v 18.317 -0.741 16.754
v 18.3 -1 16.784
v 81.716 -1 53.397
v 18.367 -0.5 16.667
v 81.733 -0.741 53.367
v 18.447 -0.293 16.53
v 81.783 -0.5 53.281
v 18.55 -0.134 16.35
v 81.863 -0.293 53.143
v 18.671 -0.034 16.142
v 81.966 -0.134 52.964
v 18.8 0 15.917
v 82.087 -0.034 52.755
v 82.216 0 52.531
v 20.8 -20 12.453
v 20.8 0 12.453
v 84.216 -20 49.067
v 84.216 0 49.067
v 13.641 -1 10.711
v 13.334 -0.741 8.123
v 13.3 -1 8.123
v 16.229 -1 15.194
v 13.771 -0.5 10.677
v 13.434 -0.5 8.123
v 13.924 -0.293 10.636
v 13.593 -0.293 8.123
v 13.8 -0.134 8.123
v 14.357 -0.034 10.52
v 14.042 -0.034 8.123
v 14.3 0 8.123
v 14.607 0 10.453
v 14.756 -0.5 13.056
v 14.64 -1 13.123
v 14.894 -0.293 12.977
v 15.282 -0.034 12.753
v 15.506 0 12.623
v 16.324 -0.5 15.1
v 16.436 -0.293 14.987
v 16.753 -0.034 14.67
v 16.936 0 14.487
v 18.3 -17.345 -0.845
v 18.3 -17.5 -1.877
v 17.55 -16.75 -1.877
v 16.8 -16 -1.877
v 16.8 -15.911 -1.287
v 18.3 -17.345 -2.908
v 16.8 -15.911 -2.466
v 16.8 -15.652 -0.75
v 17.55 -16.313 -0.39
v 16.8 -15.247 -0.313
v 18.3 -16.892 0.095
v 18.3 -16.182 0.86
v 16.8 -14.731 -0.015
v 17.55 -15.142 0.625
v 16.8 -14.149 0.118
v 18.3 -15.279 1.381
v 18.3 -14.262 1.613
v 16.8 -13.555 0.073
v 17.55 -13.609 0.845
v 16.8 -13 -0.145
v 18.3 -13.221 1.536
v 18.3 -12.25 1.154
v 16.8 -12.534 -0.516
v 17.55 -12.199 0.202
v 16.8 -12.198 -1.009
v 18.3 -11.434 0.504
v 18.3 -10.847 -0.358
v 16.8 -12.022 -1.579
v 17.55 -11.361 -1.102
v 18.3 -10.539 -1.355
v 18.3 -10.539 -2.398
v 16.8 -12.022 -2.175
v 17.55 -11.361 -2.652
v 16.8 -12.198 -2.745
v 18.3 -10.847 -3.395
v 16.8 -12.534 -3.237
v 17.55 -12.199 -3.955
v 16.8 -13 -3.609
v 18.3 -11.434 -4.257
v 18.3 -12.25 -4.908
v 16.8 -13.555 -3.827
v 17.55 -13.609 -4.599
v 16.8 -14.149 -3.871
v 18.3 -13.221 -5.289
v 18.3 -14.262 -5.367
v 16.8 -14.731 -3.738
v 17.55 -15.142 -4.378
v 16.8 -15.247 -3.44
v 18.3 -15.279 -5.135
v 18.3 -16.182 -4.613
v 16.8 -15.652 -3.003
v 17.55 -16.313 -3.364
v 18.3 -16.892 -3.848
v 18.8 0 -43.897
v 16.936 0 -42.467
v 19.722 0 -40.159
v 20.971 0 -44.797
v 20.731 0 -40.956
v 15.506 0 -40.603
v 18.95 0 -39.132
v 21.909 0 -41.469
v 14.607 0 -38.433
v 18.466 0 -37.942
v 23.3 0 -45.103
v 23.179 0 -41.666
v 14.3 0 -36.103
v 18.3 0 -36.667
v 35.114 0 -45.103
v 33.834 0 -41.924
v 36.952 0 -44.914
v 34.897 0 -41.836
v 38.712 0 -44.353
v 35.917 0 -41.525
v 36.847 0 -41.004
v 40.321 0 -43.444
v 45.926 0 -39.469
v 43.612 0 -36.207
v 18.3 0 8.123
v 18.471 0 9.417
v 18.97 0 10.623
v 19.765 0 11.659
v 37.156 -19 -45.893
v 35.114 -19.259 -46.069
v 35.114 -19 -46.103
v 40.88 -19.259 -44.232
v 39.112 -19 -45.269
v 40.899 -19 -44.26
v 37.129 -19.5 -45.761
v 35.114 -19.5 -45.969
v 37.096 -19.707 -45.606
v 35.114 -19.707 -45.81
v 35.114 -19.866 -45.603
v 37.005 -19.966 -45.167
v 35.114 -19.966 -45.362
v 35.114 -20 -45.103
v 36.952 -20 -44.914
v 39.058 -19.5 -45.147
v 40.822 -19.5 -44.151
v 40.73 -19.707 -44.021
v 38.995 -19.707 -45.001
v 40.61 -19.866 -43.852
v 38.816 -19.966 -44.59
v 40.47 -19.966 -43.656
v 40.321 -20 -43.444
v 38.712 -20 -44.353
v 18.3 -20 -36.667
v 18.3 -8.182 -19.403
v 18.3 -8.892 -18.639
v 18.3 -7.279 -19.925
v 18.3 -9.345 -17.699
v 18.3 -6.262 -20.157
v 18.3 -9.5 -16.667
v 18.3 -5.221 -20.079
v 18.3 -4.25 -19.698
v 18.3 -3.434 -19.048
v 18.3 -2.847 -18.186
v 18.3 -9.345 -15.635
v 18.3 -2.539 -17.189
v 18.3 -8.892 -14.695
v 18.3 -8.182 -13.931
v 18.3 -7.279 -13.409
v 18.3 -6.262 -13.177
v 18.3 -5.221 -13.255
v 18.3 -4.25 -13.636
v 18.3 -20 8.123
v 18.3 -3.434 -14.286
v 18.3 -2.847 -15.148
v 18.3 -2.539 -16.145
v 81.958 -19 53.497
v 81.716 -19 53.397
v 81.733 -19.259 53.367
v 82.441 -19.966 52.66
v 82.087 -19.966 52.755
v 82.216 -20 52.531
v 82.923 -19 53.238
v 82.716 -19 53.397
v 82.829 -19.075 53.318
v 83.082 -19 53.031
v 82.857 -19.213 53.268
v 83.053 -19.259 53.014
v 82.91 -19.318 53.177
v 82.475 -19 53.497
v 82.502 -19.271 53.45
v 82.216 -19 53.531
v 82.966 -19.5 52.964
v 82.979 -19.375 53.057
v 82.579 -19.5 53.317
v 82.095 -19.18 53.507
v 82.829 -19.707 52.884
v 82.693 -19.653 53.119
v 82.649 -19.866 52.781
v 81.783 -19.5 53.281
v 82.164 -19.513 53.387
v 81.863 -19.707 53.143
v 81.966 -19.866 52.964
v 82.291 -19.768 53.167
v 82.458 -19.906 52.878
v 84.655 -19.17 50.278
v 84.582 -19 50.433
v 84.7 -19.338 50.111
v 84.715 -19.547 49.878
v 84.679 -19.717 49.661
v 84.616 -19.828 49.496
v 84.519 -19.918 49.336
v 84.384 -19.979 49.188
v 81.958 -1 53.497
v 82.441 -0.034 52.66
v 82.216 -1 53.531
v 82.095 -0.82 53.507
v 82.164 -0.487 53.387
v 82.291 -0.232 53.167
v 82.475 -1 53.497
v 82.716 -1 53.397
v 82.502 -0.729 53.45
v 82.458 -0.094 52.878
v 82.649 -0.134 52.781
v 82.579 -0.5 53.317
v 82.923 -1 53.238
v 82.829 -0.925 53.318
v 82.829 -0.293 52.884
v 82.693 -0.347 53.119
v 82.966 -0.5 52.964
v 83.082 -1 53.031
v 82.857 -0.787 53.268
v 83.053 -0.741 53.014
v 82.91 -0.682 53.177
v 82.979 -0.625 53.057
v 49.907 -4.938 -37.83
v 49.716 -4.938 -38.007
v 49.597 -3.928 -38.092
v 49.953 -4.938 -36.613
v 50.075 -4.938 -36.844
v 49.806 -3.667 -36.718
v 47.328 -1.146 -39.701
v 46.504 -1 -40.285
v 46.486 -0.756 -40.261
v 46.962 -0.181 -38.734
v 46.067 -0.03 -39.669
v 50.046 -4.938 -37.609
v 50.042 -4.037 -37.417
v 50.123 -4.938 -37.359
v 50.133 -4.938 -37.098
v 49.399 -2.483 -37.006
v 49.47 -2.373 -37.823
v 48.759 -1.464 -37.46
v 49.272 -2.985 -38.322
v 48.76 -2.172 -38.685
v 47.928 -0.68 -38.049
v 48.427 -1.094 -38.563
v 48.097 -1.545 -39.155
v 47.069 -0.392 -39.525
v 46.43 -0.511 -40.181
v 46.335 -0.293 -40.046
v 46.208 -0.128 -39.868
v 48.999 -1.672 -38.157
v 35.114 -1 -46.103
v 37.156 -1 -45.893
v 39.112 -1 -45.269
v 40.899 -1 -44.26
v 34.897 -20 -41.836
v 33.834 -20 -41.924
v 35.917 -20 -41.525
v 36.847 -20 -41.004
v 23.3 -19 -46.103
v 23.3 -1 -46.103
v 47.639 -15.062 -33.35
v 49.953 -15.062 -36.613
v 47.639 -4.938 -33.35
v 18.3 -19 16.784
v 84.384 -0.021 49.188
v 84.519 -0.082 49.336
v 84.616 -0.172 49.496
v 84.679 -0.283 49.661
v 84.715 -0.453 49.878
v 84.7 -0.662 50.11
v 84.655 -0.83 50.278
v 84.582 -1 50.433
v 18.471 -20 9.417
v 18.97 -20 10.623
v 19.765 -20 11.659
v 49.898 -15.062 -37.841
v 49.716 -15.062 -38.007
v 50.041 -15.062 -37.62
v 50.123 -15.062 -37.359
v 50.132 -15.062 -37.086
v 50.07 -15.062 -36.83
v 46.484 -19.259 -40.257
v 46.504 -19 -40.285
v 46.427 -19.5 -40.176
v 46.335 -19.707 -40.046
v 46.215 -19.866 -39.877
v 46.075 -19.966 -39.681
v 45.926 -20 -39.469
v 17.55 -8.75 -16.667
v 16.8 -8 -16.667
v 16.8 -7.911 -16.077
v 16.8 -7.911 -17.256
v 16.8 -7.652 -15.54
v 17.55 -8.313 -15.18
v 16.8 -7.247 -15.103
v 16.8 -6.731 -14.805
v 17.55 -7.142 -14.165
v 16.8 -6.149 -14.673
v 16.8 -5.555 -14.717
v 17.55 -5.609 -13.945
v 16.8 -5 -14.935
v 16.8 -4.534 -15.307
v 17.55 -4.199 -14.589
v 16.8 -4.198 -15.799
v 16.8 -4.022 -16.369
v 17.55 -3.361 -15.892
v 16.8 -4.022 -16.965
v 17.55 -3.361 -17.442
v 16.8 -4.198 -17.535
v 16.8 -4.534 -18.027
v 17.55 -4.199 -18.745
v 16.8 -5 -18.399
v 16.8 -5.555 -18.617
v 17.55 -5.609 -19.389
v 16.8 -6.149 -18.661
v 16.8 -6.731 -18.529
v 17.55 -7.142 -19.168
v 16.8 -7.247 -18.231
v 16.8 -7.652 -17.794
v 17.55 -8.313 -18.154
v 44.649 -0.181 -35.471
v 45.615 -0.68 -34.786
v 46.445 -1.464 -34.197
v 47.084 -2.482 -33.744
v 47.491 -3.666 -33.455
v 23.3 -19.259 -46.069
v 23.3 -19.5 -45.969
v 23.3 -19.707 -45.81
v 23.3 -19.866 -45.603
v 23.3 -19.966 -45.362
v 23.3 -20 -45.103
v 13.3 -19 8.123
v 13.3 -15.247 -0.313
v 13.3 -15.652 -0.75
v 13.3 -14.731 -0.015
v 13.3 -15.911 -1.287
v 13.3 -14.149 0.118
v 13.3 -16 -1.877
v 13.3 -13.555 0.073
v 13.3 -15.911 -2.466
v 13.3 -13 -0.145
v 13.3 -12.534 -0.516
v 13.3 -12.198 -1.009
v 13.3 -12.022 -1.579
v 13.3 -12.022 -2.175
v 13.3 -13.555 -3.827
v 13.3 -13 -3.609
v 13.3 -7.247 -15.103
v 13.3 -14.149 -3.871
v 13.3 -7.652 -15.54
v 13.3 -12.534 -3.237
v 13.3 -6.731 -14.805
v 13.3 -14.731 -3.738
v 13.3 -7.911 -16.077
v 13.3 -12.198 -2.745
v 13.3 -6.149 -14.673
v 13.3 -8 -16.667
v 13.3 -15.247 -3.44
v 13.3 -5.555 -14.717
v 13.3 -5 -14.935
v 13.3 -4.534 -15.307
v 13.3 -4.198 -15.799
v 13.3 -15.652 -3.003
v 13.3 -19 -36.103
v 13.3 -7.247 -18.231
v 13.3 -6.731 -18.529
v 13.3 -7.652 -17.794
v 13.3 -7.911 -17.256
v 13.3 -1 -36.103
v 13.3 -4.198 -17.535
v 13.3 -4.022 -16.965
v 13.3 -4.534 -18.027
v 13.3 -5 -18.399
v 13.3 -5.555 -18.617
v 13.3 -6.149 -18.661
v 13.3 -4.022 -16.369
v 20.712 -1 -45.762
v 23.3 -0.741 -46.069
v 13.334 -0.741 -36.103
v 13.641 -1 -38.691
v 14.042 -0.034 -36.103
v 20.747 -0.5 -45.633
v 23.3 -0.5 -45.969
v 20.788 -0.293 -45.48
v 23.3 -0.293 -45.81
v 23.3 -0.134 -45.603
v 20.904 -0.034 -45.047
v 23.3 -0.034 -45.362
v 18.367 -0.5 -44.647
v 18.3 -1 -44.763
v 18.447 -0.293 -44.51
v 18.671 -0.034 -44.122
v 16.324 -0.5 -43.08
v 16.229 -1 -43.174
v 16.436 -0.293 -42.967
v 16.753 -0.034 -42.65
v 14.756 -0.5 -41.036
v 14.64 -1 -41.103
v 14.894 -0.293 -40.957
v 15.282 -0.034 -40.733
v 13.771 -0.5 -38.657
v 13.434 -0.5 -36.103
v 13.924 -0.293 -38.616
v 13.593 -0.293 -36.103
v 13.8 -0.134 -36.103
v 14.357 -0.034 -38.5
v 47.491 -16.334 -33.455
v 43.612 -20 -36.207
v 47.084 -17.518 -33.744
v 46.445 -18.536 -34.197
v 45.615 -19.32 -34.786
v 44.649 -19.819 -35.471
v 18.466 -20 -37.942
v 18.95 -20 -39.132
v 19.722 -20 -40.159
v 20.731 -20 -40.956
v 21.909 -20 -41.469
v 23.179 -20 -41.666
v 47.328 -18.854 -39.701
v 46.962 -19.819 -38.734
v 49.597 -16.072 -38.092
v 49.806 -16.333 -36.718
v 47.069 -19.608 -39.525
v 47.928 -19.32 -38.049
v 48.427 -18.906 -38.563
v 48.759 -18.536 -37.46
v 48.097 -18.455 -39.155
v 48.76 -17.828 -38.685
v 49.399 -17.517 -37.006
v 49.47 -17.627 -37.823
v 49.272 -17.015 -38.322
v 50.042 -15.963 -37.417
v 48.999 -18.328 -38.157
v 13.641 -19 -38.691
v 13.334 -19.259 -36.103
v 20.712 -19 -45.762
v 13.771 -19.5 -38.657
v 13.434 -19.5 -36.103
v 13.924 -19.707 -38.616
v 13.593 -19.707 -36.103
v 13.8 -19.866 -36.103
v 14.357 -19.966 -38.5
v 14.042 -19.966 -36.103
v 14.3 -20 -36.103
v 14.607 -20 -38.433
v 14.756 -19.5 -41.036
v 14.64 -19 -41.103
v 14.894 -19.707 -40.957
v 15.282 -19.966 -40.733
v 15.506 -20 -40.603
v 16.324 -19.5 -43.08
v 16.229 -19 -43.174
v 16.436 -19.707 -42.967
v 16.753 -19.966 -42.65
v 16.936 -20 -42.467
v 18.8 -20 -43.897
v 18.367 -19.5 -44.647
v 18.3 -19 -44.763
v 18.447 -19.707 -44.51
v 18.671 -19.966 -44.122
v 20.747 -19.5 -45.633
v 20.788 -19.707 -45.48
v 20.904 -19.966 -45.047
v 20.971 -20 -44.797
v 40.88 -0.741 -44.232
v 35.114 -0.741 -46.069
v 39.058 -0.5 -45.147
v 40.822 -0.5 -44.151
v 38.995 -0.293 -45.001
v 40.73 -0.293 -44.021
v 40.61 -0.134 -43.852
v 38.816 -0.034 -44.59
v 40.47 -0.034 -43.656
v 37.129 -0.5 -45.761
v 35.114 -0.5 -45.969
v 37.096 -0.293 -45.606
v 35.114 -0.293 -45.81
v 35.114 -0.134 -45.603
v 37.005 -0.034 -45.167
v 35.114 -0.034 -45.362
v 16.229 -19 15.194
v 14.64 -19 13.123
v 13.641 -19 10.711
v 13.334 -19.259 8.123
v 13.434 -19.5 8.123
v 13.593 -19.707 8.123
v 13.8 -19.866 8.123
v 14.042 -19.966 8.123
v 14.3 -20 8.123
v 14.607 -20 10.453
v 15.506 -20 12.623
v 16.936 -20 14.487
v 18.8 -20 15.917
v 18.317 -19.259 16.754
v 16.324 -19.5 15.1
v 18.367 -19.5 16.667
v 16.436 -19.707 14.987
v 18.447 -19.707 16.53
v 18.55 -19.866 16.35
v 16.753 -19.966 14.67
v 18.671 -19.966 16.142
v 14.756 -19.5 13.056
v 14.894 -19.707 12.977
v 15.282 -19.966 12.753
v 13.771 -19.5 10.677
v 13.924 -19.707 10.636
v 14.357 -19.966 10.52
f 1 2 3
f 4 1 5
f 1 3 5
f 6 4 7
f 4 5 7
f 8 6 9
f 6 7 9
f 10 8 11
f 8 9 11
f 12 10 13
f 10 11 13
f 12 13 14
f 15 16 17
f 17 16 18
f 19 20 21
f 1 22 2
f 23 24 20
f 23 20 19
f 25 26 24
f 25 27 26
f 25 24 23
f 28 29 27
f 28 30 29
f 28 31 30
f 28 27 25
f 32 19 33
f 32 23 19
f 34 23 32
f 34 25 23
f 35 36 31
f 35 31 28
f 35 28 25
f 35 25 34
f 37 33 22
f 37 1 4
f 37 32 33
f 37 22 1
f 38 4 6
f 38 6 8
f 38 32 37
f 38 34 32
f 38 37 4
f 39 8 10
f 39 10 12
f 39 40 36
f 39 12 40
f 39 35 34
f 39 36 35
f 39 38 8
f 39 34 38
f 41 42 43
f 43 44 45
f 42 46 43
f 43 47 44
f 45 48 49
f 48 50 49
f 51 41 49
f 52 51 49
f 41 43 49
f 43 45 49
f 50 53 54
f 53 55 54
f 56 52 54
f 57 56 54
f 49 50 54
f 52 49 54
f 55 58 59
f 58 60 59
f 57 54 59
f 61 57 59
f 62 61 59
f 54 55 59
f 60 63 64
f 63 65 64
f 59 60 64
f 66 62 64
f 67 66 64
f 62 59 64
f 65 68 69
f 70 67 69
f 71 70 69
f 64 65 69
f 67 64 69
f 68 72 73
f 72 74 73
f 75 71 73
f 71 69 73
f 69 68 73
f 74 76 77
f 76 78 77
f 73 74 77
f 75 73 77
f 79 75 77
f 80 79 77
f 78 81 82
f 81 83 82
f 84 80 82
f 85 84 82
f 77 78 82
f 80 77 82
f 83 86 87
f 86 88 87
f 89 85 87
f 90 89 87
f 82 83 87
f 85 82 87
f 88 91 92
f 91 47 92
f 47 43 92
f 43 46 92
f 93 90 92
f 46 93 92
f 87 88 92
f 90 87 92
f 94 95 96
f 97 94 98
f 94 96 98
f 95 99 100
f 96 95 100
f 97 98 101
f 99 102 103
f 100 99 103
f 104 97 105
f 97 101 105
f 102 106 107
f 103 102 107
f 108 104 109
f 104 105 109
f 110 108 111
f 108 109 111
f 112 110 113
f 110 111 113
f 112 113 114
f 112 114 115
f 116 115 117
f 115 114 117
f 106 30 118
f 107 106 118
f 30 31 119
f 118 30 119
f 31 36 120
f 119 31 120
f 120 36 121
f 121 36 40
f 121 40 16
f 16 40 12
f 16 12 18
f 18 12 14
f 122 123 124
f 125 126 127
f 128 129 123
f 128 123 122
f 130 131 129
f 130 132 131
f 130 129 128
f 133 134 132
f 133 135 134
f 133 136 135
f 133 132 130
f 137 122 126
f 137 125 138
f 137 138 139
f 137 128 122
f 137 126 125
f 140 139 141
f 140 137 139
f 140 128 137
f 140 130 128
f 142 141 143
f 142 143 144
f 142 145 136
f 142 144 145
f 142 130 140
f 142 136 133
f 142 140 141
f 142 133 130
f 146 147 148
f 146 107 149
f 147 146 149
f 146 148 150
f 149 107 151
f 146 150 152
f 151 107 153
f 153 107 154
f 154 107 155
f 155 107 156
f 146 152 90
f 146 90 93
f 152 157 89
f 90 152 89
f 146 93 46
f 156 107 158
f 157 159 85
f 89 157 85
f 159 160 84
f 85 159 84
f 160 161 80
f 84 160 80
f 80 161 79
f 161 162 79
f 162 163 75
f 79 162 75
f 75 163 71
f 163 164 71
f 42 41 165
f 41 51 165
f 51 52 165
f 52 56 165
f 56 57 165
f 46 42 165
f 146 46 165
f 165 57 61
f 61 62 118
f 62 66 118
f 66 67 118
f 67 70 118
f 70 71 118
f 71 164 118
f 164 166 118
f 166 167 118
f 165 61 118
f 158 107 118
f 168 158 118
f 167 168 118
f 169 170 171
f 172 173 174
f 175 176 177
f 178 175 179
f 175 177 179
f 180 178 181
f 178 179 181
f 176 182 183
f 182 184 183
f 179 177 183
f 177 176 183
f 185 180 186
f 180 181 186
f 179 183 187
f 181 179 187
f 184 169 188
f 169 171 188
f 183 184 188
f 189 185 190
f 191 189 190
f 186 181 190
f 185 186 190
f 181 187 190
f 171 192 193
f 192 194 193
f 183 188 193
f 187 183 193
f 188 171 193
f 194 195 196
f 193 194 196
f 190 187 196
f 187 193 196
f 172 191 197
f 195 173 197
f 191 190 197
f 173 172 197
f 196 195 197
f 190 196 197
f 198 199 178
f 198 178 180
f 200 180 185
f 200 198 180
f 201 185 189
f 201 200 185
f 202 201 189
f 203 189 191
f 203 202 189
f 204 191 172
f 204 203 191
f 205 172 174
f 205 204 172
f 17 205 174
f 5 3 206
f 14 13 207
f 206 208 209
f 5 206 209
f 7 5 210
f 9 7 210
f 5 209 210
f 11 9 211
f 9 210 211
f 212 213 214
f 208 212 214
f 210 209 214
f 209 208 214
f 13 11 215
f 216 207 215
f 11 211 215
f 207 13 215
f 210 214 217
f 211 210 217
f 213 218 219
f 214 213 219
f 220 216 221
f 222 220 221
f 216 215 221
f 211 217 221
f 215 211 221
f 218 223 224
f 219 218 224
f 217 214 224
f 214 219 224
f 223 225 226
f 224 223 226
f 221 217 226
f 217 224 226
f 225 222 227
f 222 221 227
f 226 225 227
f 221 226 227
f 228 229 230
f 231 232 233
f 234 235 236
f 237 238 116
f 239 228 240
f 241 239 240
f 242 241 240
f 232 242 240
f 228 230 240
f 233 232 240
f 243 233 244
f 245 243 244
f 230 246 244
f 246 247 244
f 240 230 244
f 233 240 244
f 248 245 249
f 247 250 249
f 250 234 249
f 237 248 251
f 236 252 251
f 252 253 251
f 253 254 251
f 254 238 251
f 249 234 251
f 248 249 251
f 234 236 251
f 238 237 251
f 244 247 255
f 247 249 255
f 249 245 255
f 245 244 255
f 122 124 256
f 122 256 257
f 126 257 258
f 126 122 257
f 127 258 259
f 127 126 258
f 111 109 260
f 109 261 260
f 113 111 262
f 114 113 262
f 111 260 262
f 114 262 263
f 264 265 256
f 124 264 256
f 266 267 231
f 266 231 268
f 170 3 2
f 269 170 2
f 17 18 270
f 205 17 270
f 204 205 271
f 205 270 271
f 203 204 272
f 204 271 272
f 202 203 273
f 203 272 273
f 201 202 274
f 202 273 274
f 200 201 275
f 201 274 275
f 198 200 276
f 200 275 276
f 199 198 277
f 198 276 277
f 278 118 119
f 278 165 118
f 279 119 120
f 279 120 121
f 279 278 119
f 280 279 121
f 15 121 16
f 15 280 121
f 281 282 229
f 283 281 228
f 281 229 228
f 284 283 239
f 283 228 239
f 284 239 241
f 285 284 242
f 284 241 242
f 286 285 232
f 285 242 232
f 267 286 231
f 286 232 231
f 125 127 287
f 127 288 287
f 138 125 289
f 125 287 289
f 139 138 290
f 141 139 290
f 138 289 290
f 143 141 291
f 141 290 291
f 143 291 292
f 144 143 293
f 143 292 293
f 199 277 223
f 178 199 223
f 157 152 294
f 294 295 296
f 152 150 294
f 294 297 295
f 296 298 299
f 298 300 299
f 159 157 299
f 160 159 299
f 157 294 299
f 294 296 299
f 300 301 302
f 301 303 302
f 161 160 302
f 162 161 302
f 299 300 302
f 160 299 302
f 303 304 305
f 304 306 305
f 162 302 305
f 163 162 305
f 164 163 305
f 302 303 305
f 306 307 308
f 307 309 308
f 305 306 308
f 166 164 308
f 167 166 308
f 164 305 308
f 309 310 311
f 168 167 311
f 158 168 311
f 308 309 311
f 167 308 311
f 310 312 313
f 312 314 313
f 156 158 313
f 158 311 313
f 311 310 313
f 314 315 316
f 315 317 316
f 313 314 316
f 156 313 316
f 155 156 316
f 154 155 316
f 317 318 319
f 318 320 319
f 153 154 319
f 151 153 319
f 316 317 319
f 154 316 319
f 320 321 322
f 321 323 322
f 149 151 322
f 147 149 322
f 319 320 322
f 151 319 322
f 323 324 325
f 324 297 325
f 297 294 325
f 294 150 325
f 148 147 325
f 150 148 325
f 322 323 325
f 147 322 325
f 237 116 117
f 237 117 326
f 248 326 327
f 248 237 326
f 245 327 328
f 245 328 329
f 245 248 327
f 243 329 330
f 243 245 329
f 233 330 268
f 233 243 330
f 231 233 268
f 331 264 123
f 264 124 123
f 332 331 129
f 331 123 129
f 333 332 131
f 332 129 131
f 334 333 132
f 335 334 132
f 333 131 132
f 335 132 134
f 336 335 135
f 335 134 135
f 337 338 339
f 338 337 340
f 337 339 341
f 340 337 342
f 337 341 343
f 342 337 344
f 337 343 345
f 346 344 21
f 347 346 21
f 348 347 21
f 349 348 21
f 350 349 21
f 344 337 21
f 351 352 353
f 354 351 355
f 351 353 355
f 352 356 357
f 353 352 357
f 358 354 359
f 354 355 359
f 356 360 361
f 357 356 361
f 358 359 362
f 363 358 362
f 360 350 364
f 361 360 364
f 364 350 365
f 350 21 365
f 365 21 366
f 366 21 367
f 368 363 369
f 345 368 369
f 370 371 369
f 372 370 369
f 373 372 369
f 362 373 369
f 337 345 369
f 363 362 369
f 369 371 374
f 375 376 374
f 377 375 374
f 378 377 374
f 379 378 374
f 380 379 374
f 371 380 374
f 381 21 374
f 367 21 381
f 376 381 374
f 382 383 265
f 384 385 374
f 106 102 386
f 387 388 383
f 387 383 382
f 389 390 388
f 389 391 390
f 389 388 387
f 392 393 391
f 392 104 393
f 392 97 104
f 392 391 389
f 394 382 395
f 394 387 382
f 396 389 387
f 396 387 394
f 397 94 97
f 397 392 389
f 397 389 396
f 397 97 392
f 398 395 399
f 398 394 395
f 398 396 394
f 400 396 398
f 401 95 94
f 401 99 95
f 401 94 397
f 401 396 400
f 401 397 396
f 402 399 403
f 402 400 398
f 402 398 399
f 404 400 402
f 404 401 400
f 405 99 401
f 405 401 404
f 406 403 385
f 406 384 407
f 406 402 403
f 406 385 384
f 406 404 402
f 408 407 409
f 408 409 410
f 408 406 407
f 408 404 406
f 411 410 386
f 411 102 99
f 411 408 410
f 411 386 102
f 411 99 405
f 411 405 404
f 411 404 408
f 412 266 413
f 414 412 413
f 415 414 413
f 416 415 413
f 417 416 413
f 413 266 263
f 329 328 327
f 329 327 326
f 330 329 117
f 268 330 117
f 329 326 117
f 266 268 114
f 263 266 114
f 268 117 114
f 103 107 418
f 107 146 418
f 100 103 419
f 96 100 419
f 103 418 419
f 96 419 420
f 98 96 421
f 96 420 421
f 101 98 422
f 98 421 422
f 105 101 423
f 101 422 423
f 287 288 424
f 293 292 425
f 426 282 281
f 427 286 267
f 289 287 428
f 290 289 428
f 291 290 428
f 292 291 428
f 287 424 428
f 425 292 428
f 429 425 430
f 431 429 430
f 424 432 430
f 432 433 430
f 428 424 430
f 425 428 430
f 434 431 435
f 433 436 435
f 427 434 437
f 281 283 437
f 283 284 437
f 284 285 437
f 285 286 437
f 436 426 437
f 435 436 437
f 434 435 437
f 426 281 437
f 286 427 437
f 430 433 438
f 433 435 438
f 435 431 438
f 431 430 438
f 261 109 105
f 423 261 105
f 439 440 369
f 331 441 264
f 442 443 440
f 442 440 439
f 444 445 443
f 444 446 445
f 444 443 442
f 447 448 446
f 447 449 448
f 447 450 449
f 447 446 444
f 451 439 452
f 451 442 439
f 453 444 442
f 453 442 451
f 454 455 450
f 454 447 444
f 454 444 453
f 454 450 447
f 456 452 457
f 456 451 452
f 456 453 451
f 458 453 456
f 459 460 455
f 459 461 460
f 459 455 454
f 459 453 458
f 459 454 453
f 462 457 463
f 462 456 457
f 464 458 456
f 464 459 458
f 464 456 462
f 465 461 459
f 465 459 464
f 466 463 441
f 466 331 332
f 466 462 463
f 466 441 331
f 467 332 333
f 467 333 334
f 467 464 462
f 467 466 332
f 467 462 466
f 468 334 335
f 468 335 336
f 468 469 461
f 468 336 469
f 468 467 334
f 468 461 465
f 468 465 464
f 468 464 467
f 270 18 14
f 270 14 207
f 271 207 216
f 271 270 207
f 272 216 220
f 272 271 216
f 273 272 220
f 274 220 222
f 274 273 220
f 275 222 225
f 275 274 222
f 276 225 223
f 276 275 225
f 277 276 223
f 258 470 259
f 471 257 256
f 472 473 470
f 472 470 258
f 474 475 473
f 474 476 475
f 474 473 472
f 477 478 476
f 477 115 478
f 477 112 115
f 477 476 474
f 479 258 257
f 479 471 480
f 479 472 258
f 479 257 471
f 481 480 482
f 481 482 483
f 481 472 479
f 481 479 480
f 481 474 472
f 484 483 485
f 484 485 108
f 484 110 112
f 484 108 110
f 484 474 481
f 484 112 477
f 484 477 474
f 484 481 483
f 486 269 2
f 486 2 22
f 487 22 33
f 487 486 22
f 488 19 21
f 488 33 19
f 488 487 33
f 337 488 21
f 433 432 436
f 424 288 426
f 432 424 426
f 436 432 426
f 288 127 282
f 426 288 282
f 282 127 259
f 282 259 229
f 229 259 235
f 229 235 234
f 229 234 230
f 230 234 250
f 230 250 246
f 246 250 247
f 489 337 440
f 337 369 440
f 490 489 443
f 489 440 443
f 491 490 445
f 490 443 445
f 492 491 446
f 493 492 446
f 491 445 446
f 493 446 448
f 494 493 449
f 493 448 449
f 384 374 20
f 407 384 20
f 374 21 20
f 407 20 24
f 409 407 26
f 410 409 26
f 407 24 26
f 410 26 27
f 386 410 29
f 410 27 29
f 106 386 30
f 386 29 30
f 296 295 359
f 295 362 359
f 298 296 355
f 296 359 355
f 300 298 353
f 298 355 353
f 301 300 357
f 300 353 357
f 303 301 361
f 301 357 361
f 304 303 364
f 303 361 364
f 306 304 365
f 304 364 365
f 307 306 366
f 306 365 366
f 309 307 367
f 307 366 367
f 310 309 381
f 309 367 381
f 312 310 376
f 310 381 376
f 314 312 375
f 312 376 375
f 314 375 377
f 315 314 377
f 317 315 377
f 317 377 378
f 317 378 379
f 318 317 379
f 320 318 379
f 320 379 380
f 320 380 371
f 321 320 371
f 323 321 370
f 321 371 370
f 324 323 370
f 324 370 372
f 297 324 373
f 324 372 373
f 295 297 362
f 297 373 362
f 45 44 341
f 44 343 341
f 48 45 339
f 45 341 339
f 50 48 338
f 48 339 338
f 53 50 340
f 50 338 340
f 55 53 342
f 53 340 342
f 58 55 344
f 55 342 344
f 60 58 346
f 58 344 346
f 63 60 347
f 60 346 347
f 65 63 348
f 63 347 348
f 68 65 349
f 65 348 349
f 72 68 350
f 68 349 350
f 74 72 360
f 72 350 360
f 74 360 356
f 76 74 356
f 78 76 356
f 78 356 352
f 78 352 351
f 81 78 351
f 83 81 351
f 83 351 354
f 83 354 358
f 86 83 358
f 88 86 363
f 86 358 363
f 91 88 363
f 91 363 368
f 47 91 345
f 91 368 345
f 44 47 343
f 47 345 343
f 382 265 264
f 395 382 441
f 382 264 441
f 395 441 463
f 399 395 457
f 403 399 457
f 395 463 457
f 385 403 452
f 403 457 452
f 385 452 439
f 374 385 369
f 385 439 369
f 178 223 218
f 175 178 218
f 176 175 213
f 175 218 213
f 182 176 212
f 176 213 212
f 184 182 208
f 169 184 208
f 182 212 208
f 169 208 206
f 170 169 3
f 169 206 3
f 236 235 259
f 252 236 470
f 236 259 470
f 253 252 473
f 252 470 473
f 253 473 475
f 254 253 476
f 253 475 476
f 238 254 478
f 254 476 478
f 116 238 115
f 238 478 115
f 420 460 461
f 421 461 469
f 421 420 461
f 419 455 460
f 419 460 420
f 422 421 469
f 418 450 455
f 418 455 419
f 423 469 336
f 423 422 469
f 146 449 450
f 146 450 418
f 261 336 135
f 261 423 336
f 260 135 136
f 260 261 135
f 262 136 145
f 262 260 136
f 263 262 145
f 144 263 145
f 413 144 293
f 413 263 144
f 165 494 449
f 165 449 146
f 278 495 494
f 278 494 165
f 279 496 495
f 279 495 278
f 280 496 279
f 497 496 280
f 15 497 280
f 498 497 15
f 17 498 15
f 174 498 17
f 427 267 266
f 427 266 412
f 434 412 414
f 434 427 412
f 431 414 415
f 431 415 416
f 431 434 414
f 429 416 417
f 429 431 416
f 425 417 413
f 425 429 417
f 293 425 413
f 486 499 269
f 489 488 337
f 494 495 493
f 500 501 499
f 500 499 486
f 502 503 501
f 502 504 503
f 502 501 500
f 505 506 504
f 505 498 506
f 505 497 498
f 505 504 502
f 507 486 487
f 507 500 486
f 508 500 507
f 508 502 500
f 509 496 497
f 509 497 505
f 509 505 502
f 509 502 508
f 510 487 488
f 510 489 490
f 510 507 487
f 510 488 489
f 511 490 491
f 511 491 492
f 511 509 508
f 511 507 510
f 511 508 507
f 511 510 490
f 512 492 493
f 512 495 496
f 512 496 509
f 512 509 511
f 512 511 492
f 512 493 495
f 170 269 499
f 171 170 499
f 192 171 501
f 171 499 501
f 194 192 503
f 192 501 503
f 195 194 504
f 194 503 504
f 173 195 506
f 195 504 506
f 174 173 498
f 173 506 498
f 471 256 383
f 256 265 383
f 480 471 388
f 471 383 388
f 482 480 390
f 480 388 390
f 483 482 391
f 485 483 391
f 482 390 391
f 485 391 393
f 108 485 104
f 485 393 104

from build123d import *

# Parameters (mm, degrees)
F1_DEPTH       = 20
F2_R           = 10
F3_R           = 10
F4_R           = 5
F5_R           = 5
F6_R           = 5
F8_D           = 4
F8_DEPTH       = 12
F8_CSINK_D     = 7
F8_CSINK_ANGLE = 90
F8_TIP         = 1.2017212381
F9_T1_DEPTH    = 30.0048285071
F10_R          = 1
F11_T1_DEPTH   = 25
F11_T3_DEPTH   = 18
F11_T5_DEPTH   = 6.5
F11_T8_ANGLE   = 90
F11_T10_ANGLE  = 90


# Not quite as in the source:
# - a fillet or chamfer that OpenCascade refuses, or shapes differently, is made with other operations: its cross-section is extruded or revolved along the edge and cut away or added


with BuildPart() as f1:
    # F0 (on Front) → F1 (new body)
    with BuildSketch(Plane.XZ):
        Polygon((13.3003787555, -46.1032405242), (38.3003787555, -46.1032405242), (50.5316518247, -37.4287553132), (47.6391971652, -33.3503112419), (35.4933471628, -41.9642139506), (18.3003787555, -41.5471586402), (18.3003787555, 11.0100081298), (85.0824110582, 49.5666324568), (82.5824110582, 53.8967594758), (13.3003787555, 13.8967594758), align=None)
    extrude(amount=F1_DEPTH)

    # F2
    f2_edges = [f1.edges().sort_by_distance(p)[0] for p in [
        (13.300379, -10, 13.896759),
        (13.300379, -10, -46.103241),
    ]]
    fillet(f2_edges, radius=F2_R)

    # F3
    f3_edges = [f1.edges().sort_by_distance(p)[0] for p in [
        (38.300379, -10, -46.103241),
    ]]
    fillet(f3_edges, radius=F3_R)

    # F4
    f4_edges = [f1.edges().sort_by_distance(p)[0] for p in [
        (18.300379, -10, 11.010008),
    ]]
    fillet(f4_edges, radius=F4_R)

    # F5
    f5_edges = [f1.edges().sort_by_distance(p)[0] for p in [
        (18.300379, -10, -41.547159),
    ]]
    fillet(f5_edges, radius=F5_R)

    # F6
    f6_edges = [f1.edges().sort_by_distance(p)[0] for p in [
        (35.493347, -10, -41.964214),
    ]]
    fillet(f6_edges, radius=F6_R)

    # F8
    with Locations(Plane.YZ.offset(18.3003787555)):
        with Locations((-6, -16.6669744052), (-14, -1.8767432161)):
            CounterSinkHole(F8_D / 2, F8_CSINK_D / 2, depth=F8_DEPTH, counter_sink_angle=F8_CSINK_ANGLE)
            with Locations((0, 0, -(F8_DEPTH + F8_TIP / 2))):  # 118° drill point
                Cone(0, F8_D / 2, F8_TIP, mode=Mode.SUBTRACT)

    # F9: fillet of radius 5 on 2 edges, made by hand

    # F9_s2 → F9_t1 (cut)
    with BuildSketch(Plane(origin=(41.804493112, 0, -58.9455349028), x_dir=(0, 1, 0), z_dir=(-0.5784909319, 0, 0.8156888143))):
        with BuildLine():
            ThreePointArc((0.0004, -14.5649419331), (-1.4644660941, -18.1014415245), (-5.0009656854, -19.5663076185))
            Line((-5.0009656854, -19.5663076185), (-5.0009656854, -20.0664441871))
            ThreePointArc((-5.0009656854, -20.0664441871), (-2.5004828427, -20.0660441871), (0, -20.0660441871))
            Line((0, -20.0660441871), (0.5001365685, -19.5659076185))
            ThreePointArc((0.5001365685, -19.5659076185), (0.5001365685, -17.0654247758), (0.5005365685, -14.5649419331))
            Line((0.5005365685, -14.5649419331), (0.0004, -14.5649419331))
        make_face()
        with BuildLine():
            ThreePointArc((-14.9990343146, -19.5663076185), (-18.5355339059, -18.1014415245), (-20.0004, -14.5649419331))
            Line((-20.0004, -14.5649419331), (-20.5005365685, -14.5649419331))
            ThreePointArc((-20.5005365685, -14.5649419331), (-20.5001365685, -17.0654247758), (-20.5001365685, -19.5659076185))
            Line((-20.5001365685, -19.5659076185), (-20, -20.0660441871))
            ThreePointArc((-20, -20.0660441871), (-17.4995171573, -20.0660441871), (-14.9990343146, -20.0664441871))
            Line((-14.9990343146, -20.0664441871), (-14.9990343146, -19.5663076185))
        make_face()
    extrude(amount=F9_T1_DEPTH, mode=Mode.SUBTRACT)

    # F10
    f10_edges = [f1.edges().sort_by_distance(p)[0] for p in [
        (50.441395, -20, 35.340135),
        (14.640125, -20, 13.123257),
        (13.300379, -20, -13.989992),
        (16.229311, -20, -43.174308),
        (29.207344, -20, -46.103241),
        (38.150024, -20, -45.631327),
        (43.701617, -20, -42.272653),
    ]]
    fillet(f10_edges, radius=F10_R)

    # F11: fillet of radius 1 on 6 edges, made by hand

    # F11_s2 → F11_t1 (cut)
    with BuildSketch(Plane.XZ.offset(-2.5)):
        with BuildLine():
            ThreePointArc((84.2163856545, 49.0666324568), (84.6823114807, 49.6738388155), (84.5824110582, 50.4326578606))
            Line((84.5824110582, 50.4326578606), (85.0824110582, 49.5666324568))
            Line((85.0824110582, 49.5666324568), (84.2163856545, 49.0666324568))
        make_face()
    extrude(amount=F11_T1_DEPTH, mode=Mode.SUBTRACT)

    # F11_s4 → F11_t3 (cut)
    with BuildSketch(Plane.XZ.offset(1)):
        with BuildLine():
            ThreePointArc((83.0824110582, 53.030734072), (82.4752046996, 53.4966598983), (81.7163856545, 53.3967594758))
            Line((81.7163856545, 53.3967594758), (82.5824110582, 53.8967594758))
            Line((82.5824110582, 53.8967594758), (83.0824110582, 53.030734072))
        make_face()
    extrude(amount=F11_T3_DEPTH, mode=Mode.SUBTRACT)

    # F11_s6 → F11_t5 (cut)
    with BuildSketch(Plane(origin=(1.0576213207, 0, -1.8318538627), x_dir=(0, 1, 0), z_dir=(-0.5, 0, 0.8660254038))):
        with BuildLine():
            ThreePointArc((0, -97.4668456201), (-0.2928932188, -98.1739524013), (-1, -98.4668456201))
            Line((-1, -98.4668456201), (0, -98.4668456201))
            Line((0, -98.4668456201), (0, -97.4668456201))
        make_face()
        with BuildLine():
            ThreePointArc((-19, -98.4668456201), (-19.7071067812, -98.1739524013), (-20, -97.4668456201))
            Line((-20, -97.4668456201), (-20, -98.4668456201))
            Line((-20, -98.4668456201), (-19, -98.4668456201))
        make_face()
    extrude(amount=F11_T5_DEPTH, mode=Mode.SUBTRACT)

    # F11_s7 → F11_t8 (revolve, cut)
    with BuildSketch(Plane.XZ.offset(1)):
        with BuildLine():
            ThreePointArc((81.7163856545, 53.3967594758), (82.4752046996, 53.4966598983), (83.0824110582, 53.030734072))
            Line((83.0824110582, 53.030734072), (82.5824110582, 53.8967594758))
            Line((82.5824110582, 53.8967594758), (81.7163856545, 53.3967594758))
        make_face()
    revolve(axis=Axis((83.0824110582, -1, 53.030734072), (-0.8660254038, 0, -0.5)), revolution_arc=F11_T8_ANGLE, mode=Mode.SUBTRACT)

    # F11_s9 → F11_t10 (revolve, cut)
    with BuildSketch(Plane.XZ.offset(19)):
        with BuildLine():
            ThreePointArc((83.0824110582, 53.030734072), (82.4752046996, 53.4966598983), (81.7163856545, 53.3967594758))
            Line((81.7163856545, 53.3967594758), (82.5824110582, 53.8967594758))
            Line((82.5824110582, 53.8967594758), (83.0824110582, 53.030734072))
        make_face()
    revolve(axis=Axis((83.0824110582, -19, 53.030734072), (0.8660254038, 0, 0.5)), revolution_arc=F11_T10_ANGLE, mode=Mode.SUBTRACT)


solid = f1.part
